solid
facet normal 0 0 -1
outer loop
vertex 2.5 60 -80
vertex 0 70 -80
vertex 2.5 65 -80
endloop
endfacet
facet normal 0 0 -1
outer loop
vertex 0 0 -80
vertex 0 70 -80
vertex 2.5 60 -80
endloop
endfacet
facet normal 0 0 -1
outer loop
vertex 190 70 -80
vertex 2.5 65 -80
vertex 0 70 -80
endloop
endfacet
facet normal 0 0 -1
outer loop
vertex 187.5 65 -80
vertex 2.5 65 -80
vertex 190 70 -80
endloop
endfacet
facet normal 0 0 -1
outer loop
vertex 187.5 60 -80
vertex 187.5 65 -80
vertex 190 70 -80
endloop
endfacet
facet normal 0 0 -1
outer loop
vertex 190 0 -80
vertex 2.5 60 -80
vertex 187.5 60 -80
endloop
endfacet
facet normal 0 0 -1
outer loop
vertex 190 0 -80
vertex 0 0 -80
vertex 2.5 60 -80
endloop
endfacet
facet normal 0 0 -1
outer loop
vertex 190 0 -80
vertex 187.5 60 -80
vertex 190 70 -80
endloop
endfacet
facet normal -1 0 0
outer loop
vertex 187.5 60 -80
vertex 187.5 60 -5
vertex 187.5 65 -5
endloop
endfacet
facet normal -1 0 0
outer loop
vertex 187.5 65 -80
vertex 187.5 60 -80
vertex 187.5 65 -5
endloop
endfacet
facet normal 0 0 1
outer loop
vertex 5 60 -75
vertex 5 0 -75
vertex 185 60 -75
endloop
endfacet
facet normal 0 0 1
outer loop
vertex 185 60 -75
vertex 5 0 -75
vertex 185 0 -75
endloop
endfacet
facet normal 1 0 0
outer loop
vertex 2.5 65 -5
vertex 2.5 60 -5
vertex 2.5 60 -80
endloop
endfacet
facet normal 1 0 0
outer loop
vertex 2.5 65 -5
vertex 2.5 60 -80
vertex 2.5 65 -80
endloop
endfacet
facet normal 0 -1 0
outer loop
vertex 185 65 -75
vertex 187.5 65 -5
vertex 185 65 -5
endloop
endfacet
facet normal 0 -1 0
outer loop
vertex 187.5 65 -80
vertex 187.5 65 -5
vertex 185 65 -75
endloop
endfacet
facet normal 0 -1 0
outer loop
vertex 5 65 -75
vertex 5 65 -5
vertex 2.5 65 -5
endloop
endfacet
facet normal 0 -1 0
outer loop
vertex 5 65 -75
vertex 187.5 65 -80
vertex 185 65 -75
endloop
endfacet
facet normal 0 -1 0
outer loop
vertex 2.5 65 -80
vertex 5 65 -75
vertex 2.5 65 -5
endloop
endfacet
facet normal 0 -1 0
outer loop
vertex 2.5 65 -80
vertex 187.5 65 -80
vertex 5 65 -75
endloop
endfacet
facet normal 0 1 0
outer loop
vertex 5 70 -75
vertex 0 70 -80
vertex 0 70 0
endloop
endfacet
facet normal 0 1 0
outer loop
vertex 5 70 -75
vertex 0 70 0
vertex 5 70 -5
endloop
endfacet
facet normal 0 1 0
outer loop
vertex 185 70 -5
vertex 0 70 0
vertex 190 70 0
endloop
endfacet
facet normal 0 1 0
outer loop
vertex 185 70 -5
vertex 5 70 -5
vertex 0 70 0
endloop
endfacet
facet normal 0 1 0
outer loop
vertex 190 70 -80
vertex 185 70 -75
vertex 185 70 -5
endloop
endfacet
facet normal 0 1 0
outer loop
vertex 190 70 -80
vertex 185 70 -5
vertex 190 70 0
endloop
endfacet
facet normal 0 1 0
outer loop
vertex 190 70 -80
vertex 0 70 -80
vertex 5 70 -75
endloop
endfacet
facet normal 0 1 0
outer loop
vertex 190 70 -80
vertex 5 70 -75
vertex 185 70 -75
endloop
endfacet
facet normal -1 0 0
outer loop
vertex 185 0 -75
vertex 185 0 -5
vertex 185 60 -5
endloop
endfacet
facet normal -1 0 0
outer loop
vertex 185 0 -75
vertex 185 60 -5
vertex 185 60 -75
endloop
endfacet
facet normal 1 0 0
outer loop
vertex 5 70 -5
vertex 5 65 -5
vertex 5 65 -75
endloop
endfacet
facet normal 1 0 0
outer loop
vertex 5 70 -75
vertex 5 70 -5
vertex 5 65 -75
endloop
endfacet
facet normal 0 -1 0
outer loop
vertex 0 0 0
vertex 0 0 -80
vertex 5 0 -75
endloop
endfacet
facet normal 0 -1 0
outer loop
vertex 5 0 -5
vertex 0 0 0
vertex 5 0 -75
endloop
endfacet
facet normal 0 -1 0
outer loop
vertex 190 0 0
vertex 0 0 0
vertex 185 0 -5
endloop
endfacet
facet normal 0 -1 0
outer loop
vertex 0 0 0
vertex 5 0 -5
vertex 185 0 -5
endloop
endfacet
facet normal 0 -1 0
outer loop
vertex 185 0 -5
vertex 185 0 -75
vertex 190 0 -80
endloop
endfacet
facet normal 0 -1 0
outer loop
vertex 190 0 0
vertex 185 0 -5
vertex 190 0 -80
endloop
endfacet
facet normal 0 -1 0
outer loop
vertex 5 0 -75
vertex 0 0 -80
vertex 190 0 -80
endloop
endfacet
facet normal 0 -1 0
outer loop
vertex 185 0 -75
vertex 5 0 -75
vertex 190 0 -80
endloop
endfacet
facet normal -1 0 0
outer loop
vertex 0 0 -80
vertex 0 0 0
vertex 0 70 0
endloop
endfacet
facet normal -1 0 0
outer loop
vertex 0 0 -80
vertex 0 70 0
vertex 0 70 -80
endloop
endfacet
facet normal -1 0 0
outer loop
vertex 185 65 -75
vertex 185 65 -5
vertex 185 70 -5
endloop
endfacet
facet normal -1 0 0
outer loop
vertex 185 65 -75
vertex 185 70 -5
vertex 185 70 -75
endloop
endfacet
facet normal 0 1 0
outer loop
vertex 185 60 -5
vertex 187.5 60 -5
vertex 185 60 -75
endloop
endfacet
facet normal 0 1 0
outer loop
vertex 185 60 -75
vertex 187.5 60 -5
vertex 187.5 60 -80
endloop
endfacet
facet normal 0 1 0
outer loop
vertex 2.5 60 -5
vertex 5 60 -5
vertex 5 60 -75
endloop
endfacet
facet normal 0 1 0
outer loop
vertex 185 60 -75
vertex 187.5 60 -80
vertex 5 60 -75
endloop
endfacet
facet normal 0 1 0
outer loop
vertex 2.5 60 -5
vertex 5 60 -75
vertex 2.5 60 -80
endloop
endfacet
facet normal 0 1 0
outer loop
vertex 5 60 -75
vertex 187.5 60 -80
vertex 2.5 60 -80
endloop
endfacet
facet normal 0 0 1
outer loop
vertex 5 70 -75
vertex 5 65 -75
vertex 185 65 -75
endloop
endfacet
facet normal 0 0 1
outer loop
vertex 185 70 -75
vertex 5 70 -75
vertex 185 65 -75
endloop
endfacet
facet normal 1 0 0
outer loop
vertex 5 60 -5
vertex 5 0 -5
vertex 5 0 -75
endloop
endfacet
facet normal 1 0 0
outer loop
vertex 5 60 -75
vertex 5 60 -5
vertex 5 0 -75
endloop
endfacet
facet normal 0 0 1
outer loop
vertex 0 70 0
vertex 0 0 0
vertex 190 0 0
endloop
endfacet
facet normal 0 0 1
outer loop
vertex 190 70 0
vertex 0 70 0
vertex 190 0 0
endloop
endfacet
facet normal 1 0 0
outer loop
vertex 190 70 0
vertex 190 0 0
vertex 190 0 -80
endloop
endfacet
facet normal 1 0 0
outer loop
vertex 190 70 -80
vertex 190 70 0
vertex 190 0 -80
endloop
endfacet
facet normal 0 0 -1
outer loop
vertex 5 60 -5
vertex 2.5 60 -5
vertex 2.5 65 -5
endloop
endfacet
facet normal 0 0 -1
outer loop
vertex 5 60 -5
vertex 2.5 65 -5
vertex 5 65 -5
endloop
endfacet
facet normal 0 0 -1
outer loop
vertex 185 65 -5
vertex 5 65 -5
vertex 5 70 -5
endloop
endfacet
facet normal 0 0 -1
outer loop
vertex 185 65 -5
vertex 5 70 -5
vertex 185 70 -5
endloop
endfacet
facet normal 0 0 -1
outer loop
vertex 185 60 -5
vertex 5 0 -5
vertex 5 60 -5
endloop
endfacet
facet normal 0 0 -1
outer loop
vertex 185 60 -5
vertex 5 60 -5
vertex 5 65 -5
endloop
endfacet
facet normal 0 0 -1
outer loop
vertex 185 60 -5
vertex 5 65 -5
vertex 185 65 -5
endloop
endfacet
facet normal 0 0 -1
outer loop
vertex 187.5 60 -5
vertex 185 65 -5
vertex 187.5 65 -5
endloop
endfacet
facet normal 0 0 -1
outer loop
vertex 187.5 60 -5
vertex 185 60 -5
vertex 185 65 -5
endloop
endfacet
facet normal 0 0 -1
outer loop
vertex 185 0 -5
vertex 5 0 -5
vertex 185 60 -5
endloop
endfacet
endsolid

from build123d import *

# Parameters (mm, degrees)
SKETCH1_W           = 190
SKETCH1_H           = 80
SKETCH1_W_2         = 180
SKETCH1_H_2         = 70
BOSS_EXTRUDE2_DEPTH = 70
SKETCH5_W           = 185
SKETCH5_H           = 5
CUT_EXTRUDE2_DEPTH  = 75


with BuildPart() as part:
    # Sketch1 → Boss-Extrude2 (new body)
    with BuildSketch(Plane(origin=(0, 0, 0), x_dir=(1, 0, 0), z_dir=(0, 1, 0))):
        with Locations((95, 40)):
            Rectangle(SKETCH1_W, SKETCH1_H)
        with Locations((95, 40)):
            Rectangle(SKETCH1_W_2, SKETCH1_H_2, mode=Mode.SUBTRACT)
    extrude(amount=BOSS_EXTRUDE2_DEPTH)

    # Sketch5 → Cut-Extrude2 (cut)
    with BuildSketch(Plane(origin=(0, 0, -80), x_dir=(-1, 0, 0), z_dir=(0, 0, -1))):
        with Locations((-95, 62.5)):
            Rectangle(SKETCH5_W, SKETCH5_H)
    extrude(amount=-CUT_EXTRUDE2_DEPTH, mode=Mode.SUBTRACT)


solid = part.part
